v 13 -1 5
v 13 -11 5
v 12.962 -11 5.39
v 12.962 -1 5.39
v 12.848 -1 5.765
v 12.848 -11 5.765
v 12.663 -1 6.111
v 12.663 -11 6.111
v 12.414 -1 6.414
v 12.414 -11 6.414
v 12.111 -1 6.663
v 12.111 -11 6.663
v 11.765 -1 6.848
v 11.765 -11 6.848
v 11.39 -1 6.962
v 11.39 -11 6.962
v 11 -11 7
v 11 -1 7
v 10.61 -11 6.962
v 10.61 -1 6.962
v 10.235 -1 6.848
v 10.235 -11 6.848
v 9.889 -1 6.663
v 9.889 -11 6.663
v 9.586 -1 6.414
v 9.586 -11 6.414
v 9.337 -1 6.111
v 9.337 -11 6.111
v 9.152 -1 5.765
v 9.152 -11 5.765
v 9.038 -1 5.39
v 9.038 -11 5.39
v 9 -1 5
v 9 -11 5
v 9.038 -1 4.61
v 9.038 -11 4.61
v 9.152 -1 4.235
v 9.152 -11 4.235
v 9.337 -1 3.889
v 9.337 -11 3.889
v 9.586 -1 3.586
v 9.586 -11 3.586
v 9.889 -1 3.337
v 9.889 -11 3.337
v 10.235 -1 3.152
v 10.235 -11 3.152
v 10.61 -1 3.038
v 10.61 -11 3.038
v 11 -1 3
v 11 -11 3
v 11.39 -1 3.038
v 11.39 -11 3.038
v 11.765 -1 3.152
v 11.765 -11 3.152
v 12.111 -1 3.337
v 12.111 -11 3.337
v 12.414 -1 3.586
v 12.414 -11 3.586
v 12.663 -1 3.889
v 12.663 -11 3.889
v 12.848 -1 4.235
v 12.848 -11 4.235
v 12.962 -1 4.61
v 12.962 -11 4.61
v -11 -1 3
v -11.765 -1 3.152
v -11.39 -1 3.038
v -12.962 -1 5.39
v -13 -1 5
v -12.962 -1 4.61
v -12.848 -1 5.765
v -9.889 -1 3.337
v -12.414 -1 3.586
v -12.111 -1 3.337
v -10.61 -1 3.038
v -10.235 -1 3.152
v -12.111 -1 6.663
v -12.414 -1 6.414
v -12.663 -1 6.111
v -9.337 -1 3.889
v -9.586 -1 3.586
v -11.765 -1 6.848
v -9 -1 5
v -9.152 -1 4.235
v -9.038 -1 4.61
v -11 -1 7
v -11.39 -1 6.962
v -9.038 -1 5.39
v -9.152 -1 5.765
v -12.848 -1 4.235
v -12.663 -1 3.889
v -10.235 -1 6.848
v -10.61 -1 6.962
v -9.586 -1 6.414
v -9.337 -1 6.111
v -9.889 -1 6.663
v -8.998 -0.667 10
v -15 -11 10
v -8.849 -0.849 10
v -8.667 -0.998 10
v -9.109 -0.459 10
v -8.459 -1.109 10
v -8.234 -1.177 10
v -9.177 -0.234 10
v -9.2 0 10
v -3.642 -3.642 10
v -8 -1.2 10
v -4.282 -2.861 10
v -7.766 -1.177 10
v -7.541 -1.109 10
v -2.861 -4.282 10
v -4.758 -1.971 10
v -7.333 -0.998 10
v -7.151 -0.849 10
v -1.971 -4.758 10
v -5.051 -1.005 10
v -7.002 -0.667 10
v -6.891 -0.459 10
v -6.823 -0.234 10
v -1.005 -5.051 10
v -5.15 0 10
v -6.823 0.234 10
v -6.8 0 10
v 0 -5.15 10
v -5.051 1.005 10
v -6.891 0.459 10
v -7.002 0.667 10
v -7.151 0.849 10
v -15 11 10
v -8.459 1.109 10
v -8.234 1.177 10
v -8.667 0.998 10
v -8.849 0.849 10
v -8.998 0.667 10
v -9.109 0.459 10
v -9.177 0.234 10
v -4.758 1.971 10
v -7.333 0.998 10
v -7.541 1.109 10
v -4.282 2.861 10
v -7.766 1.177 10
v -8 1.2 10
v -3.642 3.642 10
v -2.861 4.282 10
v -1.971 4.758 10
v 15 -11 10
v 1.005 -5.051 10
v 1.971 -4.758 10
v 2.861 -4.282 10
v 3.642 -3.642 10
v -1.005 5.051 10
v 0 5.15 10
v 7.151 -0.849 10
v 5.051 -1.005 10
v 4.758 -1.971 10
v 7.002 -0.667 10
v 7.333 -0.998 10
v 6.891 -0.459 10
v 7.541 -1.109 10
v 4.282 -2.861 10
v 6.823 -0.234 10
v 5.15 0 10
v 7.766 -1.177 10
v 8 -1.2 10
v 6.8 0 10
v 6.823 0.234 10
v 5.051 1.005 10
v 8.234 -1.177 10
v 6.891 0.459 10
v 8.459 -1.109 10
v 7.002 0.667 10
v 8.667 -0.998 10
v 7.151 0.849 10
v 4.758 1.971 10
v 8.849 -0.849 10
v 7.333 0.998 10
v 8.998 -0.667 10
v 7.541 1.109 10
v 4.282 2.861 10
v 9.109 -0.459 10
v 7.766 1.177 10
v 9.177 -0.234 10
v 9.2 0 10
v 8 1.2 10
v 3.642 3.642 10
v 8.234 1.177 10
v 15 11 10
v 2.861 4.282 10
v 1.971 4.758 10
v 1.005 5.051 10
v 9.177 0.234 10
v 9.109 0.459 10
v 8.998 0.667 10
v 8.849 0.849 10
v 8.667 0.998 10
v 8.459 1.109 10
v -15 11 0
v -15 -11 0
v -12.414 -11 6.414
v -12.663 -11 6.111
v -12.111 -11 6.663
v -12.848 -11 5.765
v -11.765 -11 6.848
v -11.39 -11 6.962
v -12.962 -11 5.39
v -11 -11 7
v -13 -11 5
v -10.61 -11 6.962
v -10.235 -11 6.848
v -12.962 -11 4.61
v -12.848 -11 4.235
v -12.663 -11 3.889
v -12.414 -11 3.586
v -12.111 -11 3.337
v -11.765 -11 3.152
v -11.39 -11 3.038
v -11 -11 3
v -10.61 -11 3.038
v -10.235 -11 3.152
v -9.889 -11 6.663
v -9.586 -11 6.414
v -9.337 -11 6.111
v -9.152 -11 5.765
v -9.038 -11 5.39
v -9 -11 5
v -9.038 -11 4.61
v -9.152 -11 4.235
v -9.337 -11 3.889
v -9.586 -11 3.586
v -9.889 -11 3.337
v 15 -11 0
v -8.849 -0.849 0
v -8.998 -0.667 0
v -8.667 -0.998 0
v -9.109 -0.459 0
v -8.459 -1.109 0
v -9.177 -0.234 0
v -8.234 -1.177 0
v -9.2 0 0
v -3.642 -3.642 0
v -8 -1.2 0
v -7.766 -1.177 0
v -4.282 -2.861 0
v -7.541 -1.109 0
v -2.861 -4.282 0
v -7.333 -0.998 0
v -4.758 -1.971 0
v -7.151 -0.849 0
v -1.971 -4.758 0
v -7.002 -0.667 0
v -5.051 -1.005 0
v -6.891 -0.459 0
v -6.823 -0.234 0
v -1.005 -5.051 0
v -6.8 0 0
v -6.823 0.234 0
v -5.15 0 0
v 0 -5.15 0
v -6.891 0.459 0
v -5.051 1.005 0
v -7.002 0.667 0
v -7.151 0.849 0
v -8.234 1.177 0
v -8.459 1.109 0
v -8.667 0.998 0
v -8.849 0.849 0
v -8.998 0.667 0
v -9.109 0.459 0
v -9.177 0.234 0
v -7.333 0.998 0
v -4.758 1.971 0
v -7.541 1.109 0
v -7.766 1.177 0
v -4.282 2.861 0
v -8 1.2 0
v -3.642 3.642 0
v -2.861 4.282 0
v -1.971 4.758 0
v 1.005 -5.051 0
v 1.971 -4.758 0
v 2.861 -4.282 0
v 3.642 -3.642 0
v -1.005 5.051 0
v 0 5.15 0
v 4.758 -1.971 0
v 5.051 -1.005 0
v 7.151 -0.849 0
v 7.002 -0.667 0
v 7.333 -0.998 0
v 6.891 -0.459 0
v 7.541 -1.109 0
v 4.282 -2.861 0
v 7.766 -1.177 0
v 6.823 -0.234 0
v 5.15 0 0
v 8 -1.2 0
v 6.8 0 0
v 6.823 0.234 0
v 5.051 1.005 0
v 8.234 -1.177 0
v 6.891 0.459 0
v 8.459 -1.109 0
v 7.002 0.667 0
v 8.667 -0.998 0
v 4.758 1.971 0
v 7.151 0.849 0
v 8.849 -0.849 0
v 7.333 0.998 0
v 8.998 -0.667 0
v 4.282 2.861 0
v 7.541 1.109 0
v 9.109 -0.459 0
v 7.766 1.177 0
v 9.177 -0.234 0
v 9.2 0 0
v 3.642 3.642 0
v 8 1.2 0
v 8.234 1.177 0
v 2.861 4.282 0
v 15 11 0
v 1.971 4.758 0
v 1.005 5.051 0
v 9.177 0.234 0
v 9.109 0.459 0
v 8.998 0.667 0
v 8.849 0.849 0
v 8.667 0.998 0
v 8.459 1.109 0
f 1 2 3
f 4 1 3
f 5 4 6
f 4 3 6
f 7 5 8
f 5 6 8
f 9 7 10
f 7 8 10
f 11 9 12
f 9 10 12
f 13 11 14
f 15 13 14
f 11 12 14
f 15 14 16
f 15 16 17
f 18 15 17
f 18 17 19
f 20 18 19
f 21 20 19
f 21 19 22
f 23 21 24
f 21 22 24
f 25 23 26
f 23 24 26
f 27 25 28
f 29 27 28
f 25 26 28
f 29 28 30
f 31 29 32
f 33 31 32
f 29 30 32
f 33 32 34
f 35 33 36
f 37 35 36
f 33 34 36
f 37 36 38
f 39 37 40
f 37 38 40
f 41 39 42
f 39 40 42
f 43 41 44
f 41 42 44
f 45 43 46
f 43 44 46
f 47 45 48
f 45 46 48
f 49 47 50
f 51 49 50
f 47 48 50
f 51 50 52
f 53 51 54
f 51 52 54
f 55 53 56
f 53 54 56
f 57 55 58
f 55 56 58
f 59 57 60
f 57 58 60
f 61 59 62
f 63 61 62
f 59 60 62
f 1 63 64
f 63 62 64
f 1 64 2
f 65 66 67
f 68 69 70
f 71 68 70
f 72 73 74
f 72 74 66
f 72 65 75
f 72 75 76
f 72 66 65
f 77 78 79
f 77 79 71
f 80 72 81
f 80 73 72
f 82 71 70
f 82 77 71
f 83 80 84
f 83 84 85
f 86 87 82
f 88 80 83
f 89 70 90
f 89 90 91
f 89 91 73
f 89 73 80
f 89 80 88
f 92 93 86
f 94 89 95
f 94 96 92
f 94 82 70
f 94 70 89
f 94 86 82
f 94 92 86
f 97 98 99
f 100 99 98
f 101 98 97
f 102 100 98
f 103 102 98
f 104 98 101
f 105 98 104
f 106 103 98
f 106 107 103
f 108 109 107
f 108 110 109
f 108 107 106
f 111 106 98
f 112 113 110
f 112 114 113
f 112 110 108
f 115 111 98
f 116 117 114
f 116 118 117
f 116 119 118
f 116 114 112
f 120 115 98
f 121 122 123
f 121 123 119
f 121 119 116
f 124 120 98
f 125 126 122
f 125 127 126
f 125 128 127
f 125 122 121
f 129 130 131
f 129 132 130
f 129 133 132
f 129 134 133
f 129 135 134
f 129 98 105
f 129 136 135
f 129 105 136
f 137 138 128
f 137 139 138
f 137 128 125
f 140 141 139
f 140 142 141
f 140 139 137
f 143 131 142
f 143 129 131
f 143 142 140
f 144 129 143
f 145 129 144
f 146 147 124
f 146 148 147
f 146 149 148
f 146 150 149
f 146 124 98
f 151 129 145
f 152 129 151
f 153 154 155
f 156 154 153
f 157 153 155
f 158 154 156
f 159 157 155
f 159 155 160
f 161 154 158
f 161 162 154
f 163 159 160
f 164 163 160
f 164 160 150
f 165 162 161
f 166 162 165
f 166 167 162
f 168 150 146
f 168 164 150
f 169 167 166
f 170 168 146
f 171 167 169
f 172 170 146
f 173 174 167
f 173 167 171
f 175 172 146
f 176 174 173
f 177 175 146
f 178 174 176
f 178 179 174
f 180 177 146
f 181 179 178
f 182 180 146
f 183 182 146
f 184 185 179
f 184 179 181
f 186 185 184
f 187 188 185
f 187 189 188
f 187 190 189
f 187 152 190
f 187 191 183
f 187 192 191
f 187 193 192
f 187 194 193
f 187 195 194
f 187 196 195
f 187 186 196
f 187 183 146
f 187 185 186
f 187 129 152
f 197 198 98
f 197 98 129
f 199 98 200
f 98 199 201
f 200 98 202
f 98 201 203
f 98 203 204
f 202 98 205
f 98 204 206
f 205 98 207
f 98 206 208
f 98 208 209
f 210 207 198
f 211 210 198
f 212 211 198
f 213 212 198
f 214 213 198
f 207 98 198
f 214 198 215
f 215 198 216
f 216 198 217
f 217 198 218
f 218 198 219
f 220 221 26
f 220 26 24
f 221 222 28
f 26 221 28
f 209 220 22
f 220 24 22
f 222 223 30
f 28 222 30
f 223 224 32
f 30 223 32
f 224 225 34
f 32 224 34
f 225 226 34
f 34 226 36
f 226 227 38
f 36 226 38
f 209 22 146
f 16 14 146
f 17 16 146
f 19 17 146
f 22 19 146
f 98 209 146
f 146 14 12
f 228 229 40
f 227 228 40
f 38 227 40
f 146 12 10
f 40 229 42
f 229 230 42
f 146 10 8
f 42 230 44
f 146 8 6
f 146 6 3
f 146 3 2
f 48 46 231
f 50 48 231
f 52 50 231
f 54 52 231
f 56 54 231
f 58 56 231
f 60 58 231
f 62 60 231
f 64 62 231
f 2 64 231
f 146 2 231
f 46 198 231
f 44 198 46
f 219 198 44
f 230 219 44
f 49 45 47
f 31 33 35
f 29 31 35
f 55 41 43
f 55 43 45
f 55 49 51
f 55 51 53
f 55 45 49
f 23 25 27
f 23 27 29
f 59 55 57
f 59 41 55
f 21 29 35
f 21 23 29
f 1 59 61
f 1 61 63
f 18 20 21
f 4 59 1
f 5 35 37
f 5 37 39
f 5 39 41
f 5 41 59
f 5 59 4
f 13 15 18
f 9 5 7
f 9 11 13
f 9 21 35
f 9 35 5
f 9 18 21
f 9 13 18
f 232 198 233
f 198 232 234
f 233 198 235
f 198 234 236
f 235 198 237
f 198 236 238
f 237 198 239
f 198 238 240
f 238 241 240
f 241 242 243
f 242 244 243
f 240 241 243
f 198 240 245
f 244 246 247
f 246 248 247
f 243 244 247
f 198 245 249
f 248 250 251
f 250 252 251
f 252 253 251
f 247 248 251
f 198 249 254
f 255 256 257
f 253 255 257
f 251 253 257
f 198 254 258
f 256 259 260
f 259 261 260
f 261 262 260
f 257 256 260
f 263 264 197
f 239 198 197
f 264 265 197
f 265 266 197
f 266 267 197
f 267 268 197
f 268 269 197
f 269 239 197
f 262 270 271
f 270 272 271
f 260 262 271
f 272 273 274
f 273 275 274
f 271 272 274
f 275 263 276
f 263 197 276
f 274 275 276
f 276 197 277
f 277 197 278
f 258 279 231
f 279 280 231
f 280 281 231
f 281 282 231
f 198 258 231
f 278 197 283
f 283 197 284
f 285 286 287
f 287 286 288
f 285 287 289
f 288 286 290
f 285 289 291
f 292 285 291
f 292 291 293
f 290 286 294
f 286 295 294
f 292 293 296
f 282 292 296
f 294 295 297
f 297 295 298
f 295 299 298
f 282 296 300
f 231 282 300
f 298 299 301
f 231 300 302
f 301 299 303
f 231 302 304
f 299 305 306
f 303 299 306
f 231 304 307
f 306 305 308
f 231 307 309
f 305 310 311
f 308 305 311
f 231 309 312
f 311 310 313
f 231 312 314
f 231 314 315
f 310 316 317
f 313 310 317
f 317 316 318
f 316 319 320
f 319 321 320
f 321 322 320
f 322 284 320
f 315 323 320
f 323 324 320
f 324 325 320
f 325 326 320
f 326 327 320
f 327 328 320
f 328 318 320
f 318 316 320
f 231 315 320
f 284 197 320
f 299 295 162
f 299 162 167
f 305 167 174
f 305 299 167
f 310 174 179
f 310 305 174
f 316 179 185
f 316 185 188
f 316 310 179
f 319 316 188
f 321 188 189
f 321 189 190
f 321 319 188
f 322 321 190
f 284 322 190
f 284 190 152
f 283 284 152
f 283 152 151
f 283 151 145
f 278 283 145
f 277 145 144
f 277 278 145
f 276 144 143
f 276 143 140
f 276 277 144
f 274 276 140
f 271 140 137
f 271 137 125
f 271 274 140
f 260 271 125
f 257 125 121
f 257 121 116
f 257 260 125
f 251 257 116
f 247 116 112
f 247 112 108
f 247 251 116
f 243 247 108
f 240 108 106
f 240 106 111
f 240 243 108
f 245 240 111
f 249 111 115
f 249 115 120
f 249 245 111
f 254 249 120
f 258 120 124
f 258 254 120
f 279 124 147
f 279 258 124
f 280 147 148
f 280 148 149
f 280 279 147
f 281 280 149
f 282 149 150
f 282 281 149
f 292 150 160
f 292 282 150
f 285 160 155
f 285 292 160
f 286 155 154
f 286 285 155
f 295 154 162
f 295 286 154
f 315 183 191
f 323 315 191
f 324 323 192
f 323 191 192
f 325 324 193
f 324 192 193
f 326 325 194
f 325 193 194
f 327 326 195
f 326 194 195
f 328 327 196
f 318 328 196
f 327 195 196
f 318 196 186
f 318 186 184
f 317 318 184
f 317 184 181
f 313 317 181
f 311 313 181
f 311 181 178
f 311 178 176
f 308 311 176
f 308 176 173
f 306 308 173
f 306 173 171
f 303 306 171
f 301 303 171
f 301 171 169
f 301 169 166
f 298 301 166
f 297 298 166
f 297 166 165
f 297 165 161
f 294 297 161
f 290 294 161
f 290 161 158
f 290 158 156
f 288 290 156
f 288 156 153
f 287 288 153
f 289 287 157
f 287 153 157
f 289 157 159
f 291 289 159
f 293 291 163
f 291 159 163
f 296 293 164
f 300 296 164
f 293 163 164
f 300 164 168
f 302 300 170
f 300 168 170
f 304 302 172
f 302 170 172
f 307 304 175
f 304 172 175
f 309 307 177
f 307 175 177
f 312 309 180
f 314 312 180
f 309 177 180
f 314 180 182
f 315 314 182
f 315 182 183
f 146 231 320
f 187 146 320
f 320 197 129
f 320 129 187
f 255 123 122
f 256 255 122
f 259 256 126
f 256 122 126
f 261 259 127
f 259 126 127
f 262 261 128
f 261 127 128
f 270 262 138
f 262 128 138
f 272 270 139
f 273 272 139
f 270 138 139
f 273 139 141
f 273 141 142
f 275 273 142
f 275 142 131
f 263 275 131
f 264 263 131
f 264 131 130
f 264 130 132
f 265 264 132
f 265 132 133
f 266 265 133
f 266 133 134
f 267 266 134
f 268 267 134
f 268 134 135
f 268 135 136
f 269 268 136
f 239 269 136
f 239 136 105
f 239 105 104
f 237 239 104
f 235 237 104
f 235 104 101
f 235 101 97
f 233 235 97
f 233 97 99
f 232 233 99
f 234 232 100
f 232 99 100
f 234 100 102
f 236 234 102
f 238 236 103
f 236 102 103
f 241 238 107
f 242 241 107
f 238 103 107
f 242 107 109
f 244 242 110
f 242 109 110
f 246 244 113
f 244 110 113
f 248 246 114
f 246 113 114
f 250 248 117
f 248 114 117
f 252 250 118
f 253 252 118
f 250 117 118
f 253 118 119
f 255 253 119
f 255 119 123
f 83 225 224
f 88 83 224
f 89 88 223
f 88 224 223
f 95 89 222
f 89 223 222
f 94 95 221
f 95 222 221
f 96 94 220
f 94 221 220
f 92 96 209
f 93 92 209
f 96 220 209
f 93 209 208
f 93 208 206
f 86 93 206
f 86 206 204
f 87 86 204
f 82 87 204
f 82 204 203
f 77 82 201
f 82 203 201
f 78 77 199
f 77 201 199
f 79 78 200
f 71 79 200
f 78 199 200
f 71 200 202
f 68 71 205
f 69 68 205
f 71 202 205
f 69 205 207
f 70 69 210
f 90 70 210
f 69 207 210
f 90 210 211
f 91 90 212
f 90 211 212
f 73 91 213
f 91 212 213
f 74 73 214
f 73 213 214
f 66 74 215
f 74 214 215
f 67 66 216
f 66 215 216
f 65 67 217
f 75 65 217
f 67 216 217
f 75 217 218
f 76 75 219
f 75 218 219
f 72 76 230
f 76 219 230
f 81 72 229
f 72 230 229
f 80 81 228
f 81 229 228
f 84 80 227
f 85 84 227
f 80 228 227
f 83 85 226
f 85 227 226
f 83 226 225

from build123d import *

# Parameters (mm, degrees)
SKETCH1_W           = 30
SKETCH1_H           = 22
SKETCH1_R           = 5.15
BOSS_EXTRUDE1_DEPTH = 10
SKETCH2_R           = 2
CUT_EXTRUDE1_DEPTH  = 10
SKETCH7_R           = 1.2
CUT_EXTRUDE2_DEPTH  = 11


with BuildPart() as part:
    # Sketch1 → Boss-Extrude1 (new body)
    with BuildSketch(Plane.XY):
        Rectangle(SKETCH1_W, SKETCH1_H)
        Circle(SKETCH1_R, mode=Mode.SUBTRACT)
    extrude(amount=BOSS_EXTRUDE1_DEPTH)

    # Sketch2 → Cut-Extrude1 (cut)
    with BuildSketch(Plane.XZ.offset(11)):
        with Locations((-11, 5)):
            Circle(SKETCH2_R)
        with Locations((11, 5)):
            Circle(SKETCH2_R)
    extrude(amount=-CUT_EXTRUDE1_DEPTH, mode=Mode.SUBTRACT)

    # Sketch7 → Cut-Extrude2 (cut, through all)
    with BuildSketch(Plane.XY.offset(10)):
        with Locations((-8, 0)):
            Circle(SKETCH7_R)
        with Locations((8, 0)):
            Circle(SKETCH7_R)
    extrude(amount=-CUT_EXTRUDE2_DEPTH, mode=Mode.SUBTRACT)


solid = part.part
